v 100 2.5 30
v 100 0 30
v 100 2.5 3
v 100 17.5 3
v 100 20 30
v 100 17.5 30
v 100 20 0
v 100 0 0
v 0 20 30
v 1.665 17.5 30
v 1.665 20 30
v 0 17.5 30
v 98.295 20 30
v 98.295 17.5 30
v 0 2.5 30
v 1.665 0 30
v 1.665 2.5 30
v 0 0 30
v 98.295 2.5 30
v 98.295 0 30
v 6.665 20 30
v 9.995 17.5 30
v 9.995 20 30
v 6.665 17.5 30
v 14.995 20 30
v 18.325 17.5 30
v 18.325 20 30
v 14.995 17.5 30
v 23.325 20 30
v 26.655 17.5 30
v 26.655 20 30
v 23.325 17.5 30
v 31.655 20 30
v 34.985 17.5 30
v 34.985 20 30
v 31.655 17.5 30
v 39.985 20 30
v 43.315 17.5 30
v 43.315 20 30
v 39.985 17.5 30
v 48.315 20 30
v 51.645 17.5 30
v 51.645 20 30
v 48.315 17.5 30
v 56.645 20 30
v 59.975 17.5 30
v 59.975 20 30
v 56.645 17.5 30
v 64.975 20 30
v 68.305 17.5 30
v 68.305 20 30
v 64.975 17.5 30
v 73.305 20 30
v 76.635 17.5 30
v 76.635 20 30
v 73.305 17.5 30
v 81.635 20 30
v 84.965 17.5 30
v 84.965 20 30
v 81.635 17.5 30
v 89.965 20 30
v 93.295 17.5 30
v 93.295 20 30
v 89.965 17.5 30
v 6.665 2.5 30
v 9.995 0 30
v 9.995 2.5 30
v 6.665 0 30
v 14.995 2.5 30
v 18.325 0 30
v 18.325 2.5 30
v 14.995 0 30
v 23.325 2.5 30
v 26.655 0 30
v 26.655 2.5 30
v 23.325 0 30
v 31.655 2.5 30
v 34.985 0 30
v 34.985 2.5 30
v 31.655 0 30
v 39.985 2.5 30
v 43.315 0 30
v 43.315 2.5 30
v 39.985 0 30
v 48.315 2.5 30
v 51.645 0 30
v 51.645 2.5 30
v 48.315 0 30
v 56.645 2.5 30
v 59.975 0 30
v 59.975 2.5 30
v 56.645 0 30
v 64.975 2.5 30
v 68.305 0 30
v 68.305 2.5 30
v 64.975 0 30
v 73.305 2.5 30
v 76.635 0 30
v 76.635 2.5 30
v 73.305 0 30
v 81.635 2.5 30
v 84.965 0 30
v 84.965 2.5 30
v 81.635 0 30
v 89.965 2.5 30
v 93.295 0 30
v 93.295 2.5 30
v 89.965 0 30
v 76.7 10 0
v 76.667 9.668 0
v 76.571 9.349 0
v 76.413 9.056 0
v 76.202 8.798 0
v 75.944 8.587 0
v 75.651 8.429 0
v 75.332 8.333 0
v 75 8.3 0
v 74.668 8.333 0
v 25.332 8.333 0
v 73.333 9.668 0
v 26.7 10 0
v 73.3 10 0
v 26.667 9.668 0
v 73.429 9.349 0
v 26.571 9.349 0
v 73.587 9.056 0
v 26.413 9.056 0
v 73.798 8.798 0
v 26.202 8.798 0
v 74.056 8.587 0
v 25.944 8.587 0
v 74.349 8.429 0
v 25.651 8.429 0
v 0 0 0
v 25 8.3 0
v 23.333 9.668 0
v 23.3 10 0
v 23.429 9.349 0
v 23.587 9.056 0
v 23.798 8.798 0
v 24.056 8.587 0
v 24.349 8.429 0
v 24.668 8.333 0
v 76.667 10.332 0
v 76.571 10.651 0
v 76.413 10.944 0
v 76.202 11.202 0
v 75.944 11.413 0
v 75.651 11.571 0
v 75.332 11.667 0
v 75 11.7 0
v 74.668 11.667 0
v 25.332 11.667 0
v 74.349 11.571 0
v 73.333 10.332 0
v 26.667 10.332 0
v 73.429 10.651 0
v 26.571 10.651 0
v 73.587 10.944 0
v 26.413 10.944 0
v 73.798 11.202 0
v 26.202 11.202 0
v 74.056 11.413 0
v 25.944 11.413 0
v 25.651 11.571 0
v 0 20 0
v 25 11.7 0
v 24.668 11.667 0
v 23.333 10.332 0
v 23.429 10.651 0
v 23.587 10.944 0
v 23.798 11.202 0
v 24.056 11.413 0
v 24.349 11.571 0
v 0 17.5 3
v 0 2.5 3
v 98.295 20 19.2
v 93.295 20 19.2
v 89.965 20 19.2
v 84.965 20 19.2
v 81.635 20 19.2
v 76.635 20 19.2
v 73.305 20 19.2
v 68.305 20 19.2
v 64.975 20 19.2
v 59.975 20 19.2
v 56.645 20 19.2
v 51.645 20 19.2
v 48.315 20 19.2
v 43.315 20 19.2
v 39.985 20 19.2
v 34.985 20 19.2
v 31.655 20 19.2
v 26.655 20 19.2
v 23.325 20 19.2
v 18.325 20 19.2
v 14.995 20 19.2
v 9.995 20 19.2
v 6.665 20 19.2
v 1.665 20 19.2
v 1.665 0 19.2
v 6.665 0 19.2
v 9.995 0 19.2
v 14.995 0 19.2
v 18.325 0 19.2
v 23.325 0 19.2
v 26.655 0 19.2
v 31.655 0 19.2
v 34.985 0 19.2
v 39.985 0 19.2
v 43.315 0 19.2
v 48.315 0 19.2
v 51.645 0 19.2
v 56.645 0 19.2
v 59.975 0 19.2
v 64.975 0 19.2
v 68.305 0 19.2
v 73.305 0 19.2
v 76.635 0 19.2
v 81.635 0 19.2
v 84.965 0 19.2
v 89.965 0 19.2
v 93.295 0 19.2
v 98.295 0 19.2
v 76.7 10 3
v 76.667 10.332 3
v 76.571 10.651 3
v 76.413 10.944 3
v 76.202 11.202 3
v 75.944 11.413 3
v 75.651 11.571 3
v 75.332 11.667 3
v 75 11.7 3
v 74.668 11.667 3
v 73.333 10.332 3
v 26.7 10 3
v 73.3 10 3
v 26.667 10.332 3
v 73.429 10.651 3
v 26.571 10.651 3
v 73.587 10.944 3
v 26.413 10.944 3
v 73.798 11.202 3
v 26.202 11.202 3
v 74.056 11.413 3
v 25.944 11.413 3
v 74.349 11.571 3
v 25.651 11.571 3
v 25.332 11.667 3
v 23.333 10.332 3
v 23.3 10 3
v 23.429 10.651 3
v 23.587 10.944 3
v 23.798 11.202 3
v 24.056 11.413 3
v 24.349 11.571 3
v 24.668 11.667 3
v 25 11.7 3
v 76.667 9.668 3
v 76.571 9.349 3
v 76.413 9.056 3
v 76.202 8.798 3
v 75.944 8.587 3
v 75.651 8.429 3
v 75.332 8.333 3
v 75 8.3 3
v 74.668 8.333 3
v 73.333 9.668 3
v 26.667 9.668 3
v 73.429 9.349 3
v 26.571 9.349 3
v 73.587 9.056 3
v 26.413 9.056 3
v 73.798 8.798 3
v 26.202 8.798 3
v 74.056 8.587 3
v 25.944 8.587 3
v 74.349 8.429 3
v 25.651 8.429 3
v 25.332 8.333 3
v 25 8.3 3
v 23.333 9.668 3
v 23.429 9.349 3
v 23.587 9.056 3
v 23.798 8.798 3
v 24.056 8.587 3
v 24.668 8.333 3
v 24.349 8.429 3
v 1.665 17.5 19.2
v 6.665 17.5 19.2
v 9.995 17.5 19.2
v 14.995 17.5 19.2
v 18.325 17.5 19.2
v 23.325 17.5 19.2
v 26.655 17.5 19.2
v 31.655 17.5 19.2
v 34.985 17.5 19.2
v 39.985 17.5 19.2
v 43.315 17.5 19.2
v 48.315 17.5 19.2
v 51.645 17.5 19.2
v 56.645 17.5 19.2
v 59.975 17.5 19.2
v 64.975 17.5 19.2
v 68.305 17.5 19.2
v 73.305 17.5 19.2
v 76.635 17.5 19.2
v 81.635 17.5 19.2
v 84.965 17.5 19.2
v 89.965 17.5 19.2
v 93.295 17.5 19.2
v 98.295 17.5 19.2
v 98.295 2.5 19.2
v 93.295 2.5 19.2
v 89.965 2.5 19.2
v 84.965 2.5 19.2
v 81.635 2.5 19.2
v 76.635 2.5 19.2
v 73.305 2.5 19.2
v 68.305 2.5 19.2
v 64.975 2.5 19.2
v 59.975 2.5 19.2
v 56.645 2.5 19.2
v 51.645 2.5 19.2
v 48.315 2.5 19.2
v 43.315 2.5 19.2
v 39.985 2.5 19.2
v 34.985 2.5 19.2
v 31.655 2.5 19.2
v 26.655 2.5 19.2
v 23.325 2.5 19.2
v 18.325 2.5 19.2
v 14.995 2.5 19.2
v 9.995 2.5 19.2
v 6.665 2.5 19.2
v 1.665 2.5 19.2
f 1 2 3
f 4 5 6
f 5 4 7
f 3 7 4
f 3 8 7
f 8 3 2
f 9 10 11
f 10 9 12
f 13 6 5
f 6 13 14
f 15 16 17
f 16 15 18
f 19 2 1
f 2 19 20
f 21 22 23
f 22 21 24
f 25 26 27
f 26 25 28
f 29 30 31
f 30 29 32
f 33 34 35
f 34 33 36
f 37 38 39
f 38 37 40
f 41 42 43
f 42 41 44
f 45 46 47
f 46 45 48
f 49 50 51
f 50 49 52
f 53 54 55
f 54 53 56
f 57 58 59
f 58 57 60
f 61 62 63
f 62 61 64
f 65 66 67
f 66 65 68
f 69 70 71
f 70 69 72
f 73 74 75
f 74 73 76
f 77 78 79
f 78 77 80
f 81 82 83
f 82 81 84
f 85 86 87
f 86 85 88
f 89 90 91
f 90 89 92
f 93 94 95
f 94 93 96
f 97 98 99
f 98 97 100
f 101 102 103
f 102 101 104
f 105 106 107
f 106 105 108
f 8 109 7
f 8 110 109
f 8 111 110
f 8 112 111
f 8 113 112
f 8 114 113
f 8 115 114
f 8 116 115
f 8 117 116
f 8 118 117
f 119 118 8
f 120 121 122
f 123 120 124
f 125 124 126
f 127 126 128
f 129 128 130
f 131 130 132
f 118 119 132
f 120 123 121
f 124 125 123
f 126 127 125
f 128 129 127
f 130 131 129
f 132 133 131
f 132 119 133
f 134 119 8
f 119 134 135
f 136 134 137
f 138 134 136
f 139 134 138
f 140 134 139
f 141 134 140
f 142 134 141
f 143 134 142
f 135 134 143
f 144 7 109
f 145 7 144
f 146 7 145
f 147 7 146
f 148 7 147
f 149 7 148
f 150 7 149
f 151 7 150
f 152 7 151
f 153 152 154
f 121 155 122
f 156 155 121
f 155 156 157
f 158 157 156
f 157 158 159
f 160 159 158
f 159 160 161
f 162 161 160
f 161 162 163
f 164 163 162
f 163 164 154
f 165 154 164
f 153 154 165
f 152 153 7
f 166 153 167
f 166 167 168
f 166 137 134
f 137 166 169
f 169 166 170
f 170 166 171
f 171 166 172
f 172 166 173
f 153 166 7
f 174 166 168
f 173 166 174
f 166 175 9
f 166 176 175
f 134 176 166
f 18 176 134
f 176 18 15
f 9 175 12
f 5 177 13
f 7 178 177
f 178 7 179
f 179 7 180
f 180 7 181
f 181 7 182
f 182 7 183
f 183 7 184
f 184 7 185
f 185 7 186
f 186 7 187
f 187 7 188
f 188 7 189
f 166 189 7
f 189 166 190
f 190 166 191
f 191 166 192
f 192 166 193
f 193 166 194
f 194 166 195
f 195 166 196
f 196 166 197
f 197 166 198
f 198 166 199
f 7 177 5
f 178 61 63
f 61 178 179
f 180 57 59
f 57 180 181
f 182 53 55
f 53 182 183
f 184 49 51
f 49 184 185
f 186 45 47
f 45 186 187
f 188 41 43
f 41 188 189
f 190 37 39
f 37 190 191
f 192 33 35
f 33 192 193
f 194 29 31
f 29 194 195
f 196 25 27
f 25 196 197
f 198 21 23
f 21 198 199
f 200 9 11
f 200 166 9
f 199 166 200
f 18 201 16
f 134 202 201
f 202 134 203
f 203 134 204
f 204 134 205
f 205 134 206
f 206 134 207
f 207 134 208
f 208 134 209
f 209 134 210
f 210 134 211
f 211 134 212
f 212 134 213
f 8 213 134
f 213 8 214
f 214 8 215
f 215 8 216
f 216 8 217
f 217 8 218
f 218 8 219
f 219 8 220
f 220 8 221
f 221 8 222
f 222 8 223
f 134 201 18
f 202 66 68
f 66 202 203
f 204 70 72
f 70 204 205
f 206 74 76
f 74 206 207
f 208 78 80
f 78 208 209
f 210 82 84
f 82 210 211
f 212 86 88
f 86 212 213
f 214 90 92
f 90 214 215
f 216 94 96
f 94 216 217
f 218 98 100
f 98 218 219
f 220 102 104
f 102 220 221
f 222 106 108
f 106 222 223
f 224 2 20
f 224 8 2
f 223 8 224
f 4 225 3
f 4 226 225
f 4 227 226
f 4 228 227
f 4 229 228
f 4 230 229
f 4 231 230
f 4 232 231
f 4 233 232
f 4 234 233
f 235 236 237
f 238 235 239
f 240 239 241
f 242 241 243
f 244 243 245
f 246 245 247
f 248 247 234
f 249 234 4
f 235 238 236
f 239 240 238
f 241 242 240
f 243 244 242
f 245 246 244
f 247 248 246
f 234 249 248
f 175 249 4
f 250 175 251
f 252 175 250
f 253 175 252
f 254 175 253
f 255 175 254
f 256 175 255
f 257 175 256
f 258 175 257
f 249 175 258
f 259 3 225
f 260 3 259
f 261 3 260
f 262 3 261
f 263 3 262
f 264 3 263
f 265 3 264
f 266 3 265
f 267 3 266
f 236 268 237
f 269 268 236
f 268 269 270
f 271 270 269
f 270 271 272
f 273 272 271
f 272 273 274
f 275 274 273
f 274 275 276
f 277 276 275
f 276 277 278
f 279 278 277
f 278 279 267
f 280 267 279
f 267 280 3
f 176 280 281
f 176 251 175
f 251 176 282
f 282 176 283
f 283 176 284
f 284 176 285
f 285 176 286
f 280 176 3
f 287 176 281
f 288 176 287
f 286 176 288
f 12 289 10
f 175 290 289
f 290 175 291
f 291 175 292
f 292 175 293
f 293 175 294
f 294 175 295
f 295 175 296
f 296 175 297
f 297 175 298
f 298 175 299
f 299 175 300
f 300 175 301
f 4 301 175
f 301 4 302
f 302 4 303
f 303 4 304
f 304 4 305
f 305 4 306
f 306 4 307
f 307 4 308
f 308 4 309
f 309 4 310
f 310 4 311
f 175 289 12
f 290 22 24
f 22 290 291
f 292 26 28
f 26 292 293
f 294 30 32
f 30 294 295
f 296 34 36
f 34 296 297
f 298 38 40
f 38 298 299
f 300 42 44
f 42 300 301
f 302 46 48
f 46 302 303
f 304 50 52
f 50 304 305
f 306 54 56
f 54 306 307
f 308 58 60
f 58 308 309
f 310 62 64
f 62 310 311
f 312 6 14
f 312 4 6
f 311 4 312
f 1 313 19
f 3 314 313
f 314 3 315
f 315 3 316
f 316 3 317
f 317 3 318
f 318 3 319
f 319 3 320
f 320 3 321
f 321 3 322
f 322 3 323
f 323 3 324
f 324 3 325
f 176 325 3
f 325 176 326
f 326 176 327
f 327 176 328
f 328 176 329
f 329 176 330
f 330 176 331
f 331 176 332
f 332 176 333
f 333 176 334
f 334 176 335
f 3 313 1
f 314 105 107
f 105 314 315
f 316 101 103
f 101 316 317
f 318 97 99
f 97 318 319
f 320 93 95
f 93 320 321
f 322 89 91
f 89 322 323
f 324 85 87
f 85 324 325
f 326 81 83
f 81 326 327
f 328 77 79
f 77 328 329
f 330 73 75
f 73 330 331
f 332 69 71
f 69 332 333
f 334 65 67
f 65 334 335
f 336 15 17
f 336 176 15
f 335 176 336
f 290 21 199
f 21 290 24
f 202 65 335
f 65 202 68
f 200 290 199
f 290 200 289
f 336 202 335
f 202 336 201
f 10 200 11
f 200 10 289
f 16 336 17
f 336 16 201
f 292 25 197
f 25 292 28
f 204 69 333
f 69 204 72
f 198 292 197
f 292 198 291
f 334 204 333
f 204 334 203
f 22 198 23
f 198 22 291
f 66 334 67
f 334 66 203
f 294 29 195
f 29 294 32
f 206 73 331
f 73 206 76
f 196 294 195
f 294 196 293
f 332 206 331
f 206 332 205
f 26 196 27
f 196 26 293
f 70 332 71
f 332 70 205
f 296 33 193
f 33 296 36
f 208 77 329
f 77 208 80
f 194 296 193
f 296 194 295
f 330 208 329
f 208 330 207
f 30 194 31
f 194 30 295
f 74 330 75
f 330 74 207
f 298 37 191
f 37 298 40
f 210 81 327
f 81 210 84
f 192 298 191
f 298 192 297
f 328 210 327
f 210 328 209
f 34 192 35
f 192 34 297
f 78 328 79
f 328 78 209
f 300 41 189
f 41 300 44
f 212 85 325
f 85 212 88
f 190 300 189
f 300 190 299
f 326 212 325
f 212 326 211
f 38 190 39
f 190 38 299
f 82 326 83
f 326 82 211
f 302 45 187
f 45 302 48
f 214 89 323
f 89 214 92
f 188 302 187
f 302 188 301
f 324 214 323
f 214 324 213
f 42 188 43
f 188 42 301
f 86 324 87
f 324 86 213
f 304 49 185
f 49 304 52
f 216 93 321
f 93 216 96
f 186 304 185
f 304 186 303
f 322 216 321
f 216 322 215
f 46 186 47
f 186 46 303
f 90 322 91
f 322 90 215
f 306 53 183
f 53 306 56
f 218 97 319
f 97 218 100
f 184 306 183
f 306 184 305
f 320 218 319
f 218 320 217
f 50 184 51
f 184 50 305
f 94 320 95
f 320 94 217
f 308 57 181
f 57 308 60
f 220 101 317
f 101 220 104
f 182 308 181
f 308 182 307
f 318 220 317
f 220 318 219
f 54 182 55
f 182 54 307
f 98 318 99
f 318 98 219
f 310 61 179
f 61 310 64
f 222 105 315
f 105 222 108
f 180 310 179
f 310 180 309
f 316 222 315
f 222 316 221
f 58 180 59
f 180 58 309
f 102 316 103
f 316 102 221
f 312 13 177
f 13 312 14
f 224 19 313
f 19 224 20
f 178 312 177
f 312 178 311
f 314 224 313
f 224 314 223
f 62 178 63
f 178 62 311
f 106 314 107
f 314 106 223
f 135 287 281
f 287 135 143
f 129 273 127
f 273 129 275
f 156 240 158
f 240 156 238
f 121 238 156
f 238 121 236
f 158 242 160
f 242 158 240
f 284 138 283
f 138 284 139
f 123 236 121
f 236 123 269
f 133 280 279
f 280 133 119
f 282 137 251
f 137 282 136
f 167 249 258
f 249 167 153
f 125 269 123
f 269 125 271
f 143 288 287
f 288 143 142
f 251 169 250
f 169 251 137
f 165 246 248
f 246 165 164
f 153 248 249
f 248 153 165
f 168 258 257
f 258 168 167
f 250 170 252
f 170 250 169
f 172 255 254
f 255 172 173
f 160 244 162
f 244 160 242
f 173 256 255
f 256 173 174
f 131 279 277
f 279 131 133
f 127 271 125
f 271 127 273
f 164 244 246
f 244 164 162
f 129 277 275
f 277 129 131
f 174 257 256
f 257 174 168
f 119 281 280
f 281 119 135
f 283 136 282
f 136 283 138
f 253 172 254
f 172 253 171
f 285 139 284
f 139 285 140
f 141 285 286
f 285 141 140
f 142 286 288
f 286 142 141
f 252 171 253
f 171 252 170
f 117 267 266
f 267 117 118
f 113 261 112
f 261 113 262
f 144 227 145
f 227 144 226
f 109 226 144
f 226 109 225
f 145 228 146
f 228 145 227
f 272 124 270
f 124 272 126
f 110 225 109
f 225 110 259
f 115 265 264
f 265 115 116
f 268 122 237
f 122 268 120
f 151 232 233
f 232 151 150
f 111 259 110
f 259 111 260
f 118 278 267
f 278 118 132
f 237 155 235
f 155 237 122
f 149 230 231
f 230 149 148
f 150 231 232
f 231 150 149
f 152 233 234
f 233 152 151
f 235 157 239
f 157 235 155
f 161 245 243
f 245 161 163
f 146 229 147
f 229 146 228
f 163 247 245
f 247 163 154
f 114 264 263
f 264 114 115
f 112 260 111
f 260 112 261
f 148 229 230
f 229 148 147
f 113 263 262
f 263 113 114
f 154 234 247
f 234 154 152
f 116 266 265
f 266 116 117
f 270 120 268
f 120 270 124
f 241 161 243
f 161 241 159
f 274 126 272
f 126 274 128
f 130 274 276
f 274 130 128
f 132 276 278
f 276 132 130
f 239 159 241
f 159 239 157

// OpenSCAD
$fn = 32;

// ----------------------------------------------------------------------
// Cable duct: 100 x 20 x 30 mm, 12 fingers
// ----------------------------------------------------------------------

// --- parameters (mm) ---
duct_len = 100;           // duct length, X
duct_w = 20;              // duct width, Y
duct_h = 30;              // duct height, Z
wall_t = 2.5;             // side wall thickness
floor_t = 3;              // floor thickness
slot_w = 5;               // finger slot width
slot_h = 16.2;            // finger slot height
fingers = 12;             // number of finger slots per side
pitch = 8.33;             // finger pitch
hole_d = 3.4;             // floor mounting hole
hole_n = 2;               // mounting holes in the floor

module shell() {
  difference() {
    cube([duct_len, duct_w, duct_h]);
    /* open top channel */
    translate([-wall_t - 1, wall_t, floor_t])
      cube([duct_len + 2 * wall_t + 2, duct_w - 2 * wall_t, duct_h + 1]);
  }
}

difference() {
  union() {
    shell();
  }
  /* finger slots cut through both side walls */
  for (i = [0 : fingers - 1]) translate([pitch / 2 + i * pitch - slot_w / 2, -1, floor_t + slot_h]) cube([slot_w, duct_w + 2, duct_h]);
  for (i = [0 : hole_n - 1]) translate([(duct_len / hole_n) * (i + 0.5), duct_w / 2, -1]) cylinder(h = floor_t + 2, d = hole_d);
}
